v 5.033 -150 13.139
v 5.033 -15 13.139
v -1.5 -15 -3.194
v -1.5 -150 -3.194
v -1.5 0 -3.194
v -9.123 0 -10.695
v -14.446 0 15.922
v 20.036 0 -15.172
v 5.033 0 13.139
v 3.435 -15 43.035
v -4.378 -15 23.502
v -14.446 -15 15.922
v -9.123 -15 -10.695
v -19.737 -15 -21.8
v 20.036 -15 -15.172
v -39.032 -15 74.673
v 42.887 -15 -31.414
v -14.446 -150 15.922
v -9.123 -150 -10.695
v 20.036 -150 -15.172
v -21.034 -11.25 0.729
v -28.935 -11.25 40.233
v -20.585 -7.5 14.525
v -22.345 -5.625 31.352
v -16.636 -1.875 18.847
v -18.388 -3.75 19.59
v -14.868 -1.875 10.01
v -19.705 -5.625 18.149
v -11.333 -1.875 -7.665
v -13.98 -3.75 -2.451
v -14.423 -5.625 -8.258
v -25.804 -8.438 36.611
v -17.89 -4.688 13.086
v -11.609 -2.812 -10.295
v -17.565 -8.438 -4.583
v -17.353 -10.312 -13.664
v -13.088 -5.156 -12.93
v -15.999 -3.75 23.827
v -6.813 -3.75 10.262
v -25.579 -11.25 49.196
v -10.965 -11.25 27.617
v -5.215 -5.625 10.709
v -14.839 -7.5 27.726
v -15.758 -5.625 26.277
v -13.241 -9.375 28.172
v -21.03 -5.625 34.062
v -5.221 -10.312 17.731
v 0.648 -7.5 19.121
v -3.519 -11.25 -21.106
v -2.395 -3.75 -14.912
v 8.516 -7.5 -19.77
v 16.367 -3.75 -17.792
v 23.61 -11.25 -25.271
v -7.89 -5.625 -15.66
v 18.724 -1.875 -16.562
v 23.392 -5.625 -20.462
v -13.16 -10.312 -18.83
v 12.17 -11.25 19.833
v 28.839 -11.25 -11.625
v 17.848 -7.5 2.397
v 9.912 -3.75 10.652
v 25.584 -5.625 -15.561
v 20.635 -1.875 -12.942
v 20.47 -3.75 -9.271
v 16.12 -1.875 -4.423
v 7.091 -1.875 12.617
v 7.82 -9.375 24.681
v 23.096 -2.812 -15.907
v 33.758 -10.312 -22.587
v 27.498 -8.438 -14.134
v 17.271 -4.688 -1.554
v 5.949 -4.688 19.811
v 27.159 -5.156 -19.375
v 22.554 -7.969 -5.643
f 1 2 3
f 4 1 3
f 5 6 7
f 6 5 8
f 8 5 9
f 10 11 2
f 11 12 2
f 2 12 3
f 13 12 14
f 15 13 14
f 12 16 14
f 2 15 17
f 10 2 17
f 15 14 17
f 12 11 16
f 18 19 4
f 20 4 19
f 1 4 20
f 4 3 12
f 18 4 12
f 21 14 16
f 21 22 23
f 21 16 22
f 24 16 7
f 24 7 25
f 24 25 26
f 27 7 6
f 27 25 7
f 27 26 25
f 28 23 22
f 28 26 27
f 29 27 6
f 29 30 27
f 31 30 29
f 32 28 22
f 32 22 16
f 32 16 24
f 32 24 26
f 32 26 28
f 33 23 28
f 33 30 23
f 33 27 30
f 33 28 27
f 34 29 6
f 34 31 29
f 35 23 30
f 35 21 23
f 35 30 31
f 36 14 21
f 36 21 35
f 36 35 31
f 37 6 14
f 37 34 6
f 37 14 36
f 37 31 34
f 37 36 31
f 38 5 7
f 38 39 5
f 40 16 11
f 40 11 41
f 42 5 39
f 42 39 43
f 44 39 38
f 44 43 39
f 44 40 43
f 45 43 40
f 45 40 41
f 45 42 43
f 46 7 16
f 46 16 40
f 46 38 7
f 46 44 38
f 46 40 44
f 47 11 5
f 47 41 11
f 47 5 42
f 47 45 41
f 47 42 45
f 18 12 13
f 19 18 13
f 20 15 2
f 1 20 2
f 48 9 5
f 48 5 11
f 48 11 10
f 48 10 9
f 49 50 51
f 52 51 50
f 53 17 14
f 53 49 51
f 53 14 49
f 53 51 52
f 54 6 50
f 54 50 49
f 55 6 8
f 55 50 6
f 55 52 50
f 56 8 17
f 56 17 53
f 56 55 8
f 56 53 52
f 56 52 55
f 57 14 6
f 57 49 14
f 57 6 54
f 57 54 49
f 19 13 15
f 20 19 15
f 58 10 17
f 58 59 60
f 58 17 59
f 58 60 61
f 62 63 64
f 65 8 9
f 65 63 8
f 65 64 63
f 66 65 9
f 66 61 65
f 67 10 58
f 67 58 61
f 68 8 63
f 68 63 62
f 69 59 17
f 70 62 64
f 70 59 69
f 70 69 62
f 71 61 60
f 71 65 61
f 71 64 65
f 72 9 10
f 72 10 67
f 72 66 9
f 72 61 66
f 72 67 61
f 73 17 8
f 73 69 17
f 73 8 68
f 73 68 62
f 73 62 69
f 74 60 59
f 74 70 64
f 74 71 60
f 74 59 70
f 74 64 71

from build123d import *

# Parameters (mm, degrees)
F1_DEPTH = 150
F2_DEPTH = 15
F2_TAPER = -40


with BuildPart() as f1:
    # F0 (on Front) → F1 (new body)
    with BuildSketch(Plane.XZ):
        Polygon((-1.5002588741, -3.1941000372), (-14.446044527, 15.9221046604), (-9.1225432232, -10.6953958049), (20.0357193127, -15.1719756424), (5.0331273116, 13.1393668242), align=None)
    extrude(amount=F1_DEPTH)

    # F0 (on Front) → F2 (join)
    with BuildSketch(Plane.XZ):
        Polygon((-1.5002588741, -3.1941000372), (-14.446044527, 15.9221046604), (-9.1225432232, -10.6953958049), (20.0357193127, -15.1719756424), (5.0331273116, 13.1393668242), align=None)
    extrude(amount=F2_DEPTH, taper=F2_TAPER)


solid = f1.part
